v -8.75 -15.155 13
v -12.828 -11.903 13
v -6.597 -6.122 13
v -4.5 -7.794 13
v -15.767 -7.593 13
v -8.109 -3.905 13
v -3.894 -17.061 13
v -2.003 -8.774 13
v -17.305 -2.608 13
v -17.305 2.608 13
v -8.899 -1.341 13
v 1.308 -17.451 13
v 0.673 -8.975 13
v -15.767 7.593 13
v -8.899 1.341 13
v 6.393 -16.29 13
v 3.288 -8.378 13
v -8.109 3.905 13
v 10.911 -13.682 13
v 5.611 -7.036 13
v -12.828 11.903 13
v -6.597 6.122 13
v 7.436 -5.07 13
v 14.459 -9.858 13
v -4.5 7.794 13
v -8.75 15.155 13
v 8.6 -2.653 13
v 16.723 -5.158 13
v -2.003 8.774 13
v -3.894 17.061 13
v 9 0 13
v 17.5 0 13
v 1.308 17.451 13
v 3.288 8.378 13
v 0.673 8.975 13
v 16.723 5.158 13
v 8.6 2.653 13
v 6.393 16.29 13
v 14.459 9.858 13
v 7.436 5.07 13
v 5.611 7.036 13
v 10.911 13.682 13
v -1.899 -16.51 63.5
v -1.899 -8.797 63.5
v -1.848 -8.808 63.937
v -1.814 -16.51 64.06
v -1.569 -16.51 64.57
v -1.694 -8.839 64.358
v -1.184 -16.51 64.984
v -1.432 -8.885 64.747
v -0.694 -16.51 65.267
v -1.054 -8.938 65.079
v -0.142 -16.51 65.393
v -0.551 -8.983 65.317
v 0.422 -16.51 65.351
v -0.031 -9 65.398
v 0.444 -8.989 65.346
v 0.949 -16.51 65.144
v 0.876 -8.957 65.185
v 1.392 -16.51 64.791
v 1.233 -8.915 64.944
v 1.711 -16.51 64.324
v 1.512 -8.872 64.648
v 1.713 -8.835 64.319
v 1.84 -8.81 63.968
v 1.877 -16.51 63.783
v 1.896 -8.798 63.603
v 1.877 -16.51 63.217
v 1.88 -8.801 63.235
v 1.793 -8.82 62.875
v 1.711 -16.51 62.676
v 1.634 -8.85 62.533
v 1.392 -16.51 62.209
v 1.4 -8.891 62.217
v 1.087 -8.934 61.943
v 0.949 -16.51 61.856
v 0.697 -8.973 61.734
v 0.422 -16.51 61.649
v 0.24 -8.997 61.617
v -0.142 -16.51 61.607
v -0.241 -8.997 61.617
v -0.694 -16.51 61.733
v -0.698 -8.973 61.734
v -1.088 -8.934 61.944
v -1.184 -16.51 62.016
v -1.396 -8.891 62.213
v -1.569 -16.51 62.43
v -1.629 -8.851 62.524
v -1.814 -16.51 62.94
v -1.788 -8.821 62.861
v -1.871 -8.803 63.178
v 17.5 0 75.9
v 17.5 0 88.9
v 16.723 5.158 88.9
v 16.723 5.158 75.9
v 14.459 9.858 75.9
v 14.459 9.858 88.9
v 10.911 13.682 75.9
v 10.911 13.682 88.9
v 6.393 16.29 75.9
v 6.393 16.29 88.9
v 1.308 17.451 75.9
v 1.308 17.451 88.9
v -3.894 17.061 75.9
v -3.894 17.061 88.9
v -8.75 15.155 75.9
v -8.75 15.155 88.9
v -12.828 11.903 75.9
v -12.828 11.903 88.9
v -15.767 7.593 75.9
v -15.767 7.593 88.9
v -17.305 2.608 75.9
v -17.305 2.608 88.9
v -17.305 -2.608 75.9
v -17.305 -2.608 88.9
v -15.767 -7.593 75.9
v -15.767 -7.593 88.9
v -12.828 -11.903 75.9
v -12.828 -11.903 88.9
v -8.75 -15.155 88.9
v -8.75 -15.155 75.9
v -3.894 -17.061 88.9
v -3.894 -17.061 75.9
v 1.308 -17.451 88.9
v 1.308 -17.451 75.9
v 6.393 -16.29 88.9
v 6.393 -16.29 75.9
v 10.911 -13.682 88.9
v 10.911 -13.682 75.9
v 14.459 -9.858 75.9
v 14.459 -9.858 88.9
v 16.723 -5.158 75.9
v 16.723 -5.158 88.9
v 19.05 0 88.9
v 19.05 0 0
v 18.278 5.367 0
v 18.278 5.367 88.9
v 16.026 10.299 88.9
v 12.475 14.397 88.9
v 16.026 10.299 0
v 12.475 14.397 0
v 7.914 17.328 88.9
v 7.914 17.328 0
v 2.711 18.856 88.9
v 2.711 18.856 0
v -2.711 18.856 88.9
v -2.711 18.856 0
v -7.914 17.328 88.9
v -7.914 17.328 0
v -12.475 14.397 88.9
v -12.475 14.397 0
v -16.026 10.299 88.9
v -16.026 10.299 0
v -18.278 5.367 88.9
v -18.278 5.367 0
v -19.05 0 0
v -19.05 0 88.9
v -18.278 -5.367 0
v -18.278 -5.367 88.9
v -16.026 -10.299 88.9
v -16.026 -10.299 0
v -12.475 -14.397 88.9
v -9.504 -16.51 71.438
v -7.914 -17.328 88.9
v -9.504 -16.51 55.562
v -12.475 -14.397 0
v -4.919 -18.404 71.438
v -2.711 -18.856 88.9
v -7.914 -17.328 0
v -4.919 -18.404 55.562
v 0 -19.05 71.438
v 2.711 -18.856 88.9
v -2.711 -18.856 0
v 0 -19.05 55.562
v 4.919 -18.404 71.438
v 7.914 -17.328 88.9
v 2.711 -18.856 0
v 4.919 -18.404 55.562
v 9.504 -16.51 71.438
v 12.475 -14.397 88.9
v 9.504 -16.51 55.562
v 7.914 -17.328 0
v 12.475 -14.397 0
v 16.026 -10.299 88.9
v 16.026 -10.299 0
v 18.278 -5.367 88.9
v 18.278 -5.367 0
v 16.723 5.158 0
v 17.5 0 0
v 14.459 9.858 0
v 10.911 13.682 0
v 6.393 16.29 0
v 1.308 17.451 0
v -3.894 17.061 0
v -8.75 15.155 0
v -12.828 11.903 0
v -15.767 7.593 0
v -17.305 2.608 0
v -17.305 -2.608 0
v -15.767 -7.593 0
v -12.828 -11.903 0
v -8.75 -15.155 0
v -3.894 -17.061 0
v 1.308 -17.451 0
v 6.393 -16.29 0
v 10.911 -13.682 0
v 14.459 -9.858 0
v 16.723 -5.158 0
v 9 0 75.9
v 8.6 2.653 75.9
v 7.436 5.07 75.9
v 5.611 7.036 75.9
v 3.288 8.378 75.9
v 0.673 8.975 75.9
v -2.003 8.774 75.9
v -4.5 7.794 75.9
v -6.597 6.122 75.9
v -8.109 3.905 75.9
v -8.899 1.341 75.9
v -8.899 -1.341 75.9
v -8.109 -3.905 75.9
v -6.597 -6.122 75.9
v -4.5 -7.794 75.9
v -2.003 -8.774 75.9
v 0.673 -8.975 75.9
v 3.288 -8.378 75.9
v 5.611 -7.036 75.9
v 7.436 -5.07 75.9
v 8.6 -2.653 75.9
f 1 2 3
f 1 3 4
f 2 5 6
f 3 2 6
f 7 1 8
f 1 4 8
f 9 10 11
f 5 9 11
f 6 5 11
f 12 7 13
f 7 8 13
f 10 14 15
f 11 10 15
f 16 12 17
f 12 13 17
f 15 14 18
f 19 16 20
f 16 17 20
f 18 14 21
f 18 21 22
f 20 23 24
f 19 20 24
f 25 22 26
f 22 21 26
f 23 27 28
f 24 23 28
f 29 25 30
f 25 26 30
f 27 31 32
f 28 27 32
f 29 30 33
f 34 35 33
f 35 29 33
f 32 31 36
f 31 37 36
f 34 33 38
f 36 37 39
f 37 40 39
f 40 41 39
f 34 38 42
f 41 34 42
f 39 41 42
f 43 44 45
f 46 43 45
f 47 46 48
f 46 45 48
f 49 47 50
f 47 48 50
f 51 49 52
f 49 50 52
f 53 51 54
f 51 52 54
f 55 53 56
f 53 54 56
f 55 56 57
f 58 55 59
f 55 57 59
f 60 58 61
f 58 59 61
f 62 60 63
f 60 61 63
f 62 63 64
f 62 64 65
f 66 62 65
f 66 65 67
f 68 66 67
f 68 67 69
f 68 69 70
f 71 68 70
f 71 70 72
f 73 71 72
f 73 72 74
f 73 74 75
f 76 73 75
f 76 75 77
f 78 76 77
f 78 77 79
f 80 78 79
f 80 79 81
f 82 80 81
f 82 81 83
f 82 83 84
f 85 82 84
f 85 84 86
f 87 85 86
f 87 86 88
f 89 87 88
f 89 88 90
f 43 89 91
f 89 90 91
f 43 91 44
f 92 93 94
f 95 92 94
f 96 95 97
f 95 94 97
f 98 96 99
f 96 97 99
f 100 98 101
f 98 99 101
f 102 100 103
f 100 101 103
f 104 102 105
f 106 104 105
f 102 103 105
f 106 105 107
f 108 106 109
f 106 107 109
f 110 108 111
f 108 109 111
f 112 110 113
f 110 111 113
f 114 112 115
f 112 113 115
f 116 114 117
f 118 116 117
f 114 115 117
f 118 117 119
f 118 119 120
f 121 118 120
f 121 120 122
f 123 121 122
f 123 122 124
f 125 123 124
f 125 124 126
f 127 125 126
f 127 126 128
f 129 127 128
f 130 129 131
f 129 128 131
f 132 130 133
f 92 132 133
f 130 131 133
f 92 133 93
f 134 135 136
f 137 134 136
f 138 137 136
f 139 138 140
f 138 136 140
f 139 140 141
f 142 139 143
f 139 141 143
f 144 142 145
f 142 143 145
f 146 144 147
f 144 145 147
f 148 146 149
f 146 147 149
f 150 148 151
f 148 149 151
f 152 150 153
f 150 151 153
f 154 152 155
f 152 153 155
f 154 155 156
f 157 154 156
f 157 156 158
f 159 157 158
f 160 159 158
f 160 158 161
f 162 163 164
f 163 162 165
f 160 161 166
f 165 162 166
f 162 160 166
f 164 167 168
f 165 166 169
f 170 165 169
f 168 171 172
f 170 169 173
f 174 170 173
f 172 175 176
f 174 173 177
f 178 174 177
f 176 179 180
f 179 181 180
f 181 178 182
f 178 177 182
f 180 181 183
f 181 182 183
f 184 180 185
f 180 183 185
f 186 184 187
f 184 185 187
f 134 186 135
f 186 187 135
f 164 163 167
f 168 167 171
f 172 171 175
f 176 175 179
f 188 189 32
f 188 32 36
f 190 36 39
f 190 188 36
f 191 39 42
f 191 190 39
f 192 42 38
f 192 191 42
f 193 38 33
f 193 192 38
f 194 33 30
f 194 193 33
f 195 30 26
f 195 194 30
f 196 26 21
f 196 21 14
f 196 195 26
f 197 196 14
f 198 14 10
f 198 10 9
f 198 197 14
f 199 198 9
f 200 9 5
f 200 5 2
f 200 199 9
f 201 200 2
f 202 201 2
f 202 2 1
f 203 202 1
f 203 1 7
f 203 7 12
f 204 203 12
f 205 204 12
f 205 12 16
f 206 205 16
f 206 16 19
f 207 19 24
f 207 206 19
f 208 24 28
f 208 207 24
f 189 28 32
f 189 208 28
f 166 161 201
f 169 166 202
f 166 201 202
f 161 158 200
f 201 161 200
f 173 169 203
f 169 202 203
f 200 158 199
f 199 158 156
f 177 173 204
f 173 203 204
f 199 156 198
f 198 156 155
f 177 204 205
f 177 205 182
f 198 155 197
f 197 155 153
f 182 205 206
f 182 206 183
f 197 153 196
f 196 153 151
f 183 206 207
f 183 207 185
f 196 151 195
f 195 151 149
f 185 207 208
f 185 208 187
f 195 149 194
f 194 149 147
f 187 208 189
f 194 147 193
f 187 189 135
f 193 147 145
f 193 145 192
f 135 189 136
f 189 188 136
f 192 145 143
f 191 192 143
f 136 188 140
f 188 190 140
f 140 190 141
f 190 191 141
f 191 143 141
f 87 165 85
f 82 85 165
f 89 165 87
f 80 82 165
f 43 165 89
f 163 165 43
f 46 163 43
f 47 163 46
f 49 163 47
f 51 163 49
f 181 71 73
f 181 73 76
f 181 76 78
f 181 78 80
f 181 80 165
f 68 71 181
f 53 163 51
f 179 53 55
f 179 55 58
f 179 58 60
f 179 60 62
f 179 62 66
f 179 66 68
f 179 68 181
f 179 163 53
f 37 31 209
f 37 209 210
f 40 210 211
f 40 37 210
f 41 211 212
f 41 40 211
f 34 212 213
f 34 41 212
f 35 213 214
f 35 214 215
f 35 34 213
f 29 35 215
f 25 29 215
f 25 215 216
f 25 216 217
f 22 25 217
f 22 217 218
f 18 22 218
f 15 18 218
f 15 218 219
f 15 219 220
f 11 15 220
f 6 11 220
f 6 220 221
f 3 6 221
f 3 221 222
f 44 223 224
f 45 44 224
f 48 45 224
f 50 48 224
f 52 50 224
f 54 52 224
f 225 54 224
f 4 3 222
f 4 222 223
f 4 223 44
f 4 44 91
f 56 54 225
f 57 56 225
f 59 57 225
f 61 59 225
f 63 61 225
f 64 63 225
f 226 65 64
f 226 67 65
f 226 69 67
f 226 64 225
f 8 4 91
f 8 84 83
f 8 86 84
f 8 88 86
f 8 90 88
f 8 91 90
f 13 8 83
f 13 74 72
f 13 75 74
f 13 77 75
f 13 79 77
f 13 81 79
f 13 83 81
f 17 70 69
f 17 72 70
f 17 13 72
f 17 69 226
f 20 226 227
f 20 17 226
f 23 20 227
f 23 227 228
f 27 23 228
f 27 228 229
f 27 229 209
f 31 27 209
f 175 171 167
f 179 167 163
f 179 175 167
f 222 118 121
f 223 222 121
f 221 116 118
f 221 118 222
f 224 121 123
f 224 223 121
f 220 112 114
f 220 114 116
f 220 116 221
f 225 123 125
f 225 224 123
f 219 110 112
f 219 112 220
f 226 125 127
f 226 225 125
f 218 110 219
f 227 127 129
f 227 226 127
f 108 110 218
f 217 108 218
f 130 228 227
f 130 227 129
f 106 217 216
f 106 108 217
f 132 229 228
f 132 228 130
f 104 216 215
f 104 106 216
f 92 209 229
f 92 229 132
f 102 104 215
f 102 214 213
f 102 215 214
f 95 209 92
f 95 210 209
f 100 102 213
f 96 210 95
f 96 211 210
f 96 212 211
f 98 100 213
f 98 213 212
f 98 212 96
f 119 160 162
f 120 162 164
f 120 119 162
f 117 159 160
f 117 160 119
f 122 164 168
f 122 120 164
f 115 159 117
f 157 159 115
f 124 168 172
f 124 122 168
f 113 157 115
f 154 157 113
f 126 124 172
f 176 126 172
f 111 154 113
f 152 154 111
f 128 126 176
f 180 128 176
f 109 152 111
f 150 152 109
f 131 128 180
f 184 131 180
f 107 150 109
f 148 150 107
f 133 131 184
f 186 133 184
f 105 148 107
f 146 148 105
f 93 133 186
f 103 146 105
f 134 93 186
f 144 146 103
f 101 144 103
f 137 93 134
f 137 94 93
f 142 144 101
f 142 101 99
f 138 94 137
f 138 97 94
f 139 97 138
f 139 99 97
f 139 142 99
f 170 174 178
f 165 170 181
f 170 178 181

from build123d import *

# Parameters (mm, degrees)
F0_R     = 19.05
F0_R_2   = 17.5
F0_R_3   = 9
F1_DEPTH = 88.9
F2_DEPTH = 13
F3_R     = 17.5
F3_R_2   = 9
F4_DEPTH = 13
F6_W     = 19.05
F6_H     = 15.875
F7_DEPTH = 2.54
F8_D     = 3.7973
F8_DEPTH = 12.7
F8_START = 2.54
F8_TIP   = 1.1408240143


with BuildPart() as f1:
    # F0 (on Top) → F1 (new body)
    with BuildSketch(Plane.XY):
        Circle(F0_R)
        Circle(F0_R_2, mode=Mode.SUBTRACT)
        Circle(F0_R_2)
        Circle(F0_R_3, mode=Mode.SUBTRACT)
    extrude(amount=F1_DEPTH)

    # F0 (on Top) → F2 (cut)
    with BuildSketch(Plane.XY):
        Circle(F0_R_2)
        Circle(F0_R_3, mode=Mode.SUBTRACT)
    extrude(amount=F2_DEPTH, mode=Mode.SUBTRACT)

    # F3 (on face) → F4 (cut)
    with BuildSketch(Plane.XY.offset(88.9)):
        Circle(F3_R)
        Circle(F3_R_2, mode=Mode.SUBTRACT)
    extrude(amount=-F4_DEPTH, mode=Mode.SUBTRACT)

    # F6 (on offset) → F7 (cut)
    with BuildSketch(Plane.XZ.offset(19.05)):
        with Locations((0, 63.5)):
            Rectangle(F6_W, F6_H)
    extrude(amount=-F7_DEPTH, mode=Mode.SUBTRACT)

    # F8
    # its depths count from where the whole tool has entered the part; down to there all is cleared
    with Locations(Plane.XZ.offset(19.05).offset(-F8_START)):
        with Locations((0, 63.5)):
            Hole(F8_D / 2, depth=F8_DEPTH)
            with Locations((0, 0, -(F8_DEPTH + F8_TIP / 2))):  # 118° drill point
                Cone(0, F8_D / 2, F8_TIP, mode=Mode.SUBTRACT)


solid = f1.part
